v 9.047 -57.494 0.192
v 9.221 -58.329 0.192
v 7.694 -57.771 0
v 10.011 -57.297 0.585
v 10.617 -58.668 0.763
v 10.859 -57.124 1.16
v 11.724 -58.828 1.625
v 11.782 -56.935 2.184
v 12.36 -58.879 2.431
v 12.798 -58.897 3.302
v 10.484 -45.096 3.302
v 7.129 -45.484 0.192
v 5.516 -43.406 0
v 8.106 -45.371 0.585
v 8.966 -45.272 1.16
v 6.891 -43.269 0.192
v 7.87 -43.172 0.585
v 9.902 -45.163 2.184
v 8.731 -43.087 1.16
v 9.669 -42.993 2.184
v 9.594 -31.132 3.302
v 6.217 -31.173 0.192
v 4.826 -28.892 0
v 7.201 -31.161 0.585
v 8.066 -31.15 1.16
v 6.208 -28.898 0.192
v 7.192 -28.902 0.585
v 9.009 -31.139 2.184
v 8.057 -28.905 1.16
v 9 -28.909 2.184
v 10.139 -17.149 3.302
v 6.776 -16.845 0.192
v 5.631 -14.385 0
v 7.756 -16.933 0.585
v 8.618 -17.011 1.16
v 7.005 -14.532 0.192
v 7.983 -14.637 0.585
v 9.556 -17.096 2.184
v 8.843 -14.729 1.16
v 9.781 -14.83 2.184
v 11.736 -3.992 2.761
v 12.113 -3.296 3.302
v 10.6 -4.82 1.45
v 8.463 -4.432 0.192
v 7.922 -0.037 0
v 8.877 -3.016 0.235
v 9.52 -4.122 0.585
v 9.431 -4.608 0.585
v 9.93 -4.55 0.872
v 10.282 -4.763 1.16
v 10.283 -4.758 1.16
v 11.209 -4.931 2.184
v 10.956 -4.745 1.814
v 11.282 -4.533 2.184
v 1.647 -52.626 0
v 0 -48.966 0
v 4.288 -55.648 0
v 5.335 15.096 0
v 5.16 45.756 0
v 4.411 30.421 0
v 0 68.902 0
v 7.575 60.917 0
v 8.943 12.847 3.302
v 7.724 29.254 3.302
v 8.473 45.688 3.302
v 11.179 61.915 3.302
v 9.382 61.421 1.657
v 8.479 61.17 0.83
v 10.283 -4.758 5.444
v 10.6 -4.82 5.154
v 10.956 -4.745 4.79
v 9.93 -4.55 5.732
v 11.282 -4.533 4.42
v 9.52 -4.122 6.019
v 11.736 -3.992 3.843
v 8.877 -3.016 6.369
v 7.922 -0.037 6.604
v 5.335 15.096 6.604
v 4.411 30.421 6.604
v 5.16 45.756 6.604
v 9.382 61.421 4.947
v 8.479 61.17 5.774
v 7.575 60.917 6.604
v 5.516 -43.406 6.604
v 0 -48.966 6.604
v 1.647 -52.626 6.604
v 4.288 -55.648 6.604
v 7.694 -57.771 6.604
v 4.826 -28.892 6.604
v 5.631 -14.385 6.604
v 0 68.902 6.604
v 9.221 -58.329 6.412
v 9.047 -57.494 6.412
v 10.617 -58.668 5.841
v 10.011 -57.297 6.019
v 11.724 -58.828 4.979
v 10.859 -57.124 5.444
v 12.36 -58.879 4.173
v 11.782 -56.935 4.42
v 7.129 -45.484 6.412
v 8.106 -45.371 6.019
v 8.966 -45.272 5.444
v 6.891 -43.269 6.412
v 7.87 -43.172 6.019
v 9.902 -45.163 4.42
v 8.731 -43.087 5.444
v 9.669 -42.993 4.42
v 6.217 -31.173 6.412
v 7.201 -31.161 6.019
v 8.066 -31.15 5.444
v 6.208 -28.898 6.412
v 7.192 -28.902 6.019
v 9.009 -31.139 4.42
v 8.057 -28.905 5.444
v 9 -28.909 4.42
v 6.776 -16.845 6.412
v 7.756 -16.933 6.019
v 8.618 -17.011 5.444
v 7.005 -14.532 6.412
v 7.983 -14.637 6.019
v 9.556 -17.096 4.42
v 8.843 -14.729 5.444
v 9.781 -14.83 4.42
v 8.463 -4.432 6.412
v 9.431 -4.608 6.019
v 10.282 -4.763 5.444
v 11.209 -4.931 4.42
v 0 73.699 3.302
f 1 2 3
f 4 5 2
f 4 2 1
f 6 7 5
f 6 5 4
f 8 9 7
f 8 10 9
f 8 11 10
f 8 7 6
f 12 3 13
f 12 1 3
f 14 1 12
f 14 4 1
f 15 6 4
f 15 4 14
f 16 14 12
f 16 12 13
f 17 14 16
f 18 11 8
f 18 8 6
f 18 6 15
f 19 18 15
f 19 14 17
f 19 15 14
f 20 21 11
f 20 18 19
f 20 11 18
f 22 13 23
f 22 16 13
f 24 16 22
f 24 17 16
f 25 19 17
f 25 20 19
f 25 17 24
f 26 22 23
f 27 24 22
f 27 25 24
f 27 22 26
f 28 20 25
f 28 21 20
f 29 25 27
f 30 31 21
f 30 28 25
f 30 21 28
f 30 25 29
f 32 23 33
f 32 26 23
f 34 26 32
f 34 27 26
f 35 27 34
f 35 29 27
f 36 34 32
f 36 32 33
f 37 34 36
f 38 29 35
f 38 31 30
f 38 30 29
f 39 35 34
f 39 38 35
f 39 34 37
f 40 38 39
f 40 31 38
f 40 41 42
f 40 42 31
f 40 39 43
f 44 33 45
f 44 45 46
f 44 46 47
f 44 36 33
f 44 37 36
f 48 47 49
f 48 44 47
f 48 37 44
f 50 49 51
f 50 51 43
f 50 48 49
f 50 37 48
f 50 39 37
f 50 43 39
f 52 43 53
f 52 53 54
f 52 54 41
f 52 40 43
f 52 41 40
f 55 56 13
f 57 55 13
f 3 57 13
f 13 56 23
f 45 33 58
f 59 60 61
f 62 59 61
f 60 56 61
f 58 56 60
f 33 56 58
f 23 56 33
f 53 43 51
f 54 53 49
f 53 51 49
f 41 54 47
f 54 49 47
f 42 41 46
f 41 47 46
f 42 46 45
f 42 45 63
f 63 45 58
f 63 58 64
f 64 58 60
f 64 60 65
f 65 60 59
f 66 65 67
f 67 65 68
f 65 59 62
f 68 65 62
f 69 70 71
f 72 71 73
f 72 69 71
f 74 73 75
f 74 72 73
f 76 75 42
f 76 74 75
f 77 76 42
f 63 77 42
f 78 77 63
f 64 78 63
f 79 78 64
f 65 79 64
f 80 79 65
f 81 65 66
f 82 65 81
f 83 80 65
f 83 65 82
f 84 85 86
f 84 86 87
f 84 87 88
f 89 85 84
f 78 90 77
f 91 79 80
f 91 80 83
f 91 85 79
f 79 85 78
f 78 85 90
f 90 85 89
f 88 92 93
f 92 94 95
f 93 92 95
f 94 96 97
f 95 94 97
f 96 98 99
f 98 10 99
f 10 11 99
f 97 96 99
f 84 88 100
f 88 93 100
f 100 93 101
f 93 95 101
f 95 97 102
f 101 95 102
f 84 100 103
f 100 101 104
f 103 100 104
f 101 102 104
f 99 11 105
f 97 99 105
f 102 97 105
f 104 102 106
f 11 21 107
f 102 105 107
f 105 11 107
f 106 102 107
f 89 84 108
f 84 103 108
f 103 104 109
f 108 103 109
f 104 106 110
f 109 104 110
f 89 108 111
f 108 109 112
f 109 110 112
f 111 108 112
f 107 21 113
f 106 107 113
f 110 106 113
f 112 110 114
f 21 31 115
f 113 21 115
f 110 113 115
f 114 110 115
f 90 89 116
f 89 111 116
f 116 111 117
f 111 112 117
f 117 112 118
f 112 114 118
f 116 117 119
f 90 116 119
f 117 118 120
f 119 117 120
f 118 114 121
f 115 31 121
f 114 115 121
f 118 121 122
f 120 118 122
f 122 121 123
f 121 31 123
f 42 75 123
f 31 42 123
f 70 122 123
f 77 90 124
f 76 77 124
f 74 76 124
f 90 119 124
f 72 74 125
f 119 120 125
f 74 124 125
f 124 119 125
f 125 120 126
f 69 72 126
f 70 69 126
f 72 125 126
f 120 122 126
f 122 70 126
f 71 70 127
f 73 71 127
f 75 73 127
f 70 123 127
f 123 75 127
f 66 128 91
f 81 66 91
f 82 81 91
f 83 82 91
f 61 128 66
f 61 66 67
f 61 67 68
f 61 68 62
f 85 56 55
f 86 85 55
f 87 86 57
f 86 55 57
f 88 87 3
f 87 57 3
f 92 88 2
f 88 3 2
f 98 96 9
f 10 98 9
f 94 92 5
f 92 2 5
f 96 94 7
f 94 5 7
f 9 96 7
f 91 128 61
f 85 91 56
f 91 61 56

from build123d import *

# Parameters (mm, degrees)
F1_DEPTH    = 6.604
F2_T2_ANGLE = 37.6266885083
F2_T4_ANGLE = 37.6266885083
F3_T1_DEPTH = 39.1771149622
F4_T2_ANGLE = 30.7081908039
F4_T4_ANGLE = 30.7081908039


# Not quite as in the source:
# - a fillet or chamfer that OpenCascade refuses, or shapes differently, is made with other operations: its cross-section is extruded or revolved along the edge and cut away or added
# - ends of sketch curves that miss each other by under 0.0002 mm in the source are joined


with BuildPart() as f1:
    # F0 (on Top) → F1 (new body)
    with BuildSketch(Plane.XY):
        with BuildLine():
            Line((0, 76.2824639678), (0, 0))
            Line((0, 0), (13.1280263886, 0))
            ThreePointArc((13.1280263886, 0), (9.4882529844, 31.2224067748), (13.1280263886, 62.4448174897))
            Line((13.1280263886, 62.4448174897), (0, 76.2824639678))
        make_face()
        with BuildLine():
            Line((13.1280263886, 0), (0, 0))
            Line((0, 0), (0, -48.9660091698))
            ThreePointArc((0, -48.9660091698), (4.8963223511, -56.1371050306), (13.1280263886, -58.900732547))
            ThreePointArc((13.1280263886, -58.900732547), (9.9051564545, -29.4503682436), (13.1280263886, 0))
        make_face()
    extrude(amount=F1_DEPTH)

    # F2: chamfer of 5.08 on 2 edges, made by hand

    # F2_s1 → F2_t2 (revolve, cut)
    with BuildSketch(Plane(origin=(5.5719325615, -16.3549575283, 0), x_dir=(0, 0, 1), z_dir=(0.3224861622, -0.9465741784, 0))):
        Polygon((1.524, -11.7983946988), (6.604, -6.7183946988), (6.604, -11.7983946988), align=None)
    revolve(axis=Axis((145.2229057415, 31.2224087449, 6.604), (0, 0, -1)), revolution_arc=F2_T2_ANGLE, mode=Mode.SUBTRACT)

    # F2_s3 → F2_t4 (revolve, cut)
    with BuildSketch(Plane(origin=(5.5719325615, -16.3549575283, 0), x_dir=(0, 0, 1), z_dir=(0.3224861622, -0.9465741784, 0))):
        Polygon((5.08, -11.7983946988), (0, -6.7183946988), (0, -11.7983946988), align=None)
    revolve(axis=Axis((145.2229057415, 31.2224087449, 0), (0, 0, -1)), revolution_arc=F2_T4_ANGLE, mode=Mode.SUBTRACT)

    # F3: chamfer of 5.08 on 2 edges, made by hand

    # F3_s2 → F3_t1 (cut)
    with BuildSketch(Plane(origin=(-20.115918924, 21.2032613595, 0), x_dir=(0, 0, 1), z_dir=(-0.6882605094, 0.725463625, 0))):
        Polygon((5.08, 52.5022075061), (0, 47.4222075061), (0, 52.5022075061), align=None)
        Polygon((1.524, 52.5022075061), (6.604, 47.4222075061), (6.604, 52.5022075061), align=None)
    extrude(amount=F3_T1_DEPTH, mode=Mode.SUBTRACT)

    # F4: fillet of radius 5.08 on 2 edges, made by hand

    # F4_s1 → F4_t2 (revolve, cut)
    with BuildSketch(Plane(origin=(22.2878822439, -69.2757873609, 0), x_dir=(0, 0, 1), z_dir=(0.3062665426, -0.9519457994, 0))):
        with BuildLine():
            ThreePointArc((6.604, 11.2139897709), (5.1161024484, 7.6218873224), (1.524, 6.1339897709))
            Line((1.524, 6.1339897709), (6.604, 6.1339897709))
            Line((6.604, 6.1339897709), (6.604, 11.2139897709))
        make_face()
    revolve(axis=Axis((146.0743134808, -29.4503662735, 6.604), (0, 0, -1)), revolution_arc=F4_T2_ANGLE, mode=Mode.SUBTRACT)

    # F4_s3 → F4_t4 (revolve, cut)
    with BuildSketch(Plane(origin=(22.2878822439, -69.2757873609, 0), x_dir=(0, 0, 1), z_dir=(0.3062665426, -0.9519457994, 0))):
        with BuildLine():
            ThreePointArc((0, 11.2139897709), (1.4878975516, 7.6218873224), (5.08, 6.1339897709))
            Line((5.08, 6.1339897709), (0, 6.1339897709))
            Line((0, 6.1339897709), (0, 11.2139897709))
        make_face()
    revolve(axis=Axis((146.0743134808, -29.4503662735, 0), (0, 0, -1)), revolution_arc=F4_T4_ANGLE, mode=Mode.SUBTRACT)


solid = f1.part
